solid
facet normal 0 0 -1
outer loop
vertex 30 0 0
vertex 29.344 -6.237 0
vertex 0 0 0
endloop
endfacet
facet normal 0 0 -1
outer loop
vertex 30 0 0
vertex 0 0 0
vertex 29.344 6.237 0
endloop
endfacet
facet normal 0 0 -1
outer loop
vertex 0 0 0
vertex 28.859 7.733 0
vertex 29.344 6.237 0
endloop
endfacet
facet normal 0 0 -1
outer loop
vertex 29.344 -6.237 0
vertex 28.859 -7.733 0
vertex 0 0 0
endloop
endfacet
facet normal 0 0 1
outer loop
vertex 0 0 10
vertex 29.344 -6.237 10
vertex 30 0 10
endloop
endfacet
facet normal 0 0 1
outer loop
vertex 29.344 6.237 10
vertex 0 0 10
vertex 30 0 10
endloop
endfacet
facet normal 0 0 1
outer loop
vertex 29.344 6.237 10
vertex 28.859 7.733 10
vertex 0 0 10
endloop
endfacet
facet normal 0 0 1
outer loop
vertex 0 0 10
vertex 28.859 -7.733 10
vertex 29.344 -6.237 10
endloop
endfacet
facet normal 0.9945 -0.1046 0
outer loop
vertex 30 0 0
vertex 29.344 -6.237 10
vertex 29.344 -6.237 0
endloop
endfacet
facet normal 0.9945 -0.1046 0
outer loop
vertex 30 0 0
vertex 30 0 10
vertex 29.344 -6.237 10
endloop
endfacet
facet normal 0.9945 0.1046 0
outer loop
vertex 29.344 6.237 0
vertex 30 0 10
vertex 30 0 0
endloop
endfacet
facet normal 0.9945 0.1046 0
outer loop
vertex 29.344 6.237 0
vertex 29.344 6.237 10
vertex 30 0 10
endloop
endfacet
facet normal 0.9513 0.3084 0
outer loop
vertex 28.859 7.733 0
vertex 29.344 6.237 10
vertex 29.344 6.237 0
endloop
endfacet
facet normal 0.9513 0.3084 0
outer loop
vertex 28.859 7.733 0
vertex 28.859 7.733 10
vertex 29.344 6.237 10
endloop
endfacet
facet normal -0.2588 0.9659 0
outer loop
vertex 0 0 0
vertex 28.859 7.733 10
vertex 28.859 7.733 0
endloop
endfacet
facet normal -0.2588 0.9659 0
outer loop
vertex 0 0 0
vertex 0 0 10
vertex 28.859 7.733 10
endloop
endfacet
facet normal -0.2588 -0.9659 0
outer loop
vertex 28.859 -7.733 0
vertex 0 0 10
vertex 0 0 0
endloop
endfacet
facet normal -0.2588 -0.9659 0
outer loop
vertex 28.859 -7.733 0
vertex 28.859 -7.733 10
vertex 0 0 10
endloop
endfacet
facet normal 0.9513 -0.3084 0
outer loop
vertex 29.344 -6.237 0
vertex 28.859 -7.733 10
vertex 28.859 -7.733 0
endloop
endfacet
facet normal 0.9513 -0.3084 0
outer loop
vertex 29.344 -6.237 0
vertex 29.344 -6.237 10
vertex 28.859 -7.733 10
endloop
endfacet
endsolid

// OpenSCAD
// Unit of length: Unit.MM
linear_extrude(height = 10.0, center = false, convexity = 2, twist = 0.0, scale = 1.0)
{
   intersection()
   {
      circle(r = 30.0);
      polygon(points = [[0.0, 0.0], [30.01, -8.0412], [30.01, 8.0412]], convexity = 2);
   }
}
